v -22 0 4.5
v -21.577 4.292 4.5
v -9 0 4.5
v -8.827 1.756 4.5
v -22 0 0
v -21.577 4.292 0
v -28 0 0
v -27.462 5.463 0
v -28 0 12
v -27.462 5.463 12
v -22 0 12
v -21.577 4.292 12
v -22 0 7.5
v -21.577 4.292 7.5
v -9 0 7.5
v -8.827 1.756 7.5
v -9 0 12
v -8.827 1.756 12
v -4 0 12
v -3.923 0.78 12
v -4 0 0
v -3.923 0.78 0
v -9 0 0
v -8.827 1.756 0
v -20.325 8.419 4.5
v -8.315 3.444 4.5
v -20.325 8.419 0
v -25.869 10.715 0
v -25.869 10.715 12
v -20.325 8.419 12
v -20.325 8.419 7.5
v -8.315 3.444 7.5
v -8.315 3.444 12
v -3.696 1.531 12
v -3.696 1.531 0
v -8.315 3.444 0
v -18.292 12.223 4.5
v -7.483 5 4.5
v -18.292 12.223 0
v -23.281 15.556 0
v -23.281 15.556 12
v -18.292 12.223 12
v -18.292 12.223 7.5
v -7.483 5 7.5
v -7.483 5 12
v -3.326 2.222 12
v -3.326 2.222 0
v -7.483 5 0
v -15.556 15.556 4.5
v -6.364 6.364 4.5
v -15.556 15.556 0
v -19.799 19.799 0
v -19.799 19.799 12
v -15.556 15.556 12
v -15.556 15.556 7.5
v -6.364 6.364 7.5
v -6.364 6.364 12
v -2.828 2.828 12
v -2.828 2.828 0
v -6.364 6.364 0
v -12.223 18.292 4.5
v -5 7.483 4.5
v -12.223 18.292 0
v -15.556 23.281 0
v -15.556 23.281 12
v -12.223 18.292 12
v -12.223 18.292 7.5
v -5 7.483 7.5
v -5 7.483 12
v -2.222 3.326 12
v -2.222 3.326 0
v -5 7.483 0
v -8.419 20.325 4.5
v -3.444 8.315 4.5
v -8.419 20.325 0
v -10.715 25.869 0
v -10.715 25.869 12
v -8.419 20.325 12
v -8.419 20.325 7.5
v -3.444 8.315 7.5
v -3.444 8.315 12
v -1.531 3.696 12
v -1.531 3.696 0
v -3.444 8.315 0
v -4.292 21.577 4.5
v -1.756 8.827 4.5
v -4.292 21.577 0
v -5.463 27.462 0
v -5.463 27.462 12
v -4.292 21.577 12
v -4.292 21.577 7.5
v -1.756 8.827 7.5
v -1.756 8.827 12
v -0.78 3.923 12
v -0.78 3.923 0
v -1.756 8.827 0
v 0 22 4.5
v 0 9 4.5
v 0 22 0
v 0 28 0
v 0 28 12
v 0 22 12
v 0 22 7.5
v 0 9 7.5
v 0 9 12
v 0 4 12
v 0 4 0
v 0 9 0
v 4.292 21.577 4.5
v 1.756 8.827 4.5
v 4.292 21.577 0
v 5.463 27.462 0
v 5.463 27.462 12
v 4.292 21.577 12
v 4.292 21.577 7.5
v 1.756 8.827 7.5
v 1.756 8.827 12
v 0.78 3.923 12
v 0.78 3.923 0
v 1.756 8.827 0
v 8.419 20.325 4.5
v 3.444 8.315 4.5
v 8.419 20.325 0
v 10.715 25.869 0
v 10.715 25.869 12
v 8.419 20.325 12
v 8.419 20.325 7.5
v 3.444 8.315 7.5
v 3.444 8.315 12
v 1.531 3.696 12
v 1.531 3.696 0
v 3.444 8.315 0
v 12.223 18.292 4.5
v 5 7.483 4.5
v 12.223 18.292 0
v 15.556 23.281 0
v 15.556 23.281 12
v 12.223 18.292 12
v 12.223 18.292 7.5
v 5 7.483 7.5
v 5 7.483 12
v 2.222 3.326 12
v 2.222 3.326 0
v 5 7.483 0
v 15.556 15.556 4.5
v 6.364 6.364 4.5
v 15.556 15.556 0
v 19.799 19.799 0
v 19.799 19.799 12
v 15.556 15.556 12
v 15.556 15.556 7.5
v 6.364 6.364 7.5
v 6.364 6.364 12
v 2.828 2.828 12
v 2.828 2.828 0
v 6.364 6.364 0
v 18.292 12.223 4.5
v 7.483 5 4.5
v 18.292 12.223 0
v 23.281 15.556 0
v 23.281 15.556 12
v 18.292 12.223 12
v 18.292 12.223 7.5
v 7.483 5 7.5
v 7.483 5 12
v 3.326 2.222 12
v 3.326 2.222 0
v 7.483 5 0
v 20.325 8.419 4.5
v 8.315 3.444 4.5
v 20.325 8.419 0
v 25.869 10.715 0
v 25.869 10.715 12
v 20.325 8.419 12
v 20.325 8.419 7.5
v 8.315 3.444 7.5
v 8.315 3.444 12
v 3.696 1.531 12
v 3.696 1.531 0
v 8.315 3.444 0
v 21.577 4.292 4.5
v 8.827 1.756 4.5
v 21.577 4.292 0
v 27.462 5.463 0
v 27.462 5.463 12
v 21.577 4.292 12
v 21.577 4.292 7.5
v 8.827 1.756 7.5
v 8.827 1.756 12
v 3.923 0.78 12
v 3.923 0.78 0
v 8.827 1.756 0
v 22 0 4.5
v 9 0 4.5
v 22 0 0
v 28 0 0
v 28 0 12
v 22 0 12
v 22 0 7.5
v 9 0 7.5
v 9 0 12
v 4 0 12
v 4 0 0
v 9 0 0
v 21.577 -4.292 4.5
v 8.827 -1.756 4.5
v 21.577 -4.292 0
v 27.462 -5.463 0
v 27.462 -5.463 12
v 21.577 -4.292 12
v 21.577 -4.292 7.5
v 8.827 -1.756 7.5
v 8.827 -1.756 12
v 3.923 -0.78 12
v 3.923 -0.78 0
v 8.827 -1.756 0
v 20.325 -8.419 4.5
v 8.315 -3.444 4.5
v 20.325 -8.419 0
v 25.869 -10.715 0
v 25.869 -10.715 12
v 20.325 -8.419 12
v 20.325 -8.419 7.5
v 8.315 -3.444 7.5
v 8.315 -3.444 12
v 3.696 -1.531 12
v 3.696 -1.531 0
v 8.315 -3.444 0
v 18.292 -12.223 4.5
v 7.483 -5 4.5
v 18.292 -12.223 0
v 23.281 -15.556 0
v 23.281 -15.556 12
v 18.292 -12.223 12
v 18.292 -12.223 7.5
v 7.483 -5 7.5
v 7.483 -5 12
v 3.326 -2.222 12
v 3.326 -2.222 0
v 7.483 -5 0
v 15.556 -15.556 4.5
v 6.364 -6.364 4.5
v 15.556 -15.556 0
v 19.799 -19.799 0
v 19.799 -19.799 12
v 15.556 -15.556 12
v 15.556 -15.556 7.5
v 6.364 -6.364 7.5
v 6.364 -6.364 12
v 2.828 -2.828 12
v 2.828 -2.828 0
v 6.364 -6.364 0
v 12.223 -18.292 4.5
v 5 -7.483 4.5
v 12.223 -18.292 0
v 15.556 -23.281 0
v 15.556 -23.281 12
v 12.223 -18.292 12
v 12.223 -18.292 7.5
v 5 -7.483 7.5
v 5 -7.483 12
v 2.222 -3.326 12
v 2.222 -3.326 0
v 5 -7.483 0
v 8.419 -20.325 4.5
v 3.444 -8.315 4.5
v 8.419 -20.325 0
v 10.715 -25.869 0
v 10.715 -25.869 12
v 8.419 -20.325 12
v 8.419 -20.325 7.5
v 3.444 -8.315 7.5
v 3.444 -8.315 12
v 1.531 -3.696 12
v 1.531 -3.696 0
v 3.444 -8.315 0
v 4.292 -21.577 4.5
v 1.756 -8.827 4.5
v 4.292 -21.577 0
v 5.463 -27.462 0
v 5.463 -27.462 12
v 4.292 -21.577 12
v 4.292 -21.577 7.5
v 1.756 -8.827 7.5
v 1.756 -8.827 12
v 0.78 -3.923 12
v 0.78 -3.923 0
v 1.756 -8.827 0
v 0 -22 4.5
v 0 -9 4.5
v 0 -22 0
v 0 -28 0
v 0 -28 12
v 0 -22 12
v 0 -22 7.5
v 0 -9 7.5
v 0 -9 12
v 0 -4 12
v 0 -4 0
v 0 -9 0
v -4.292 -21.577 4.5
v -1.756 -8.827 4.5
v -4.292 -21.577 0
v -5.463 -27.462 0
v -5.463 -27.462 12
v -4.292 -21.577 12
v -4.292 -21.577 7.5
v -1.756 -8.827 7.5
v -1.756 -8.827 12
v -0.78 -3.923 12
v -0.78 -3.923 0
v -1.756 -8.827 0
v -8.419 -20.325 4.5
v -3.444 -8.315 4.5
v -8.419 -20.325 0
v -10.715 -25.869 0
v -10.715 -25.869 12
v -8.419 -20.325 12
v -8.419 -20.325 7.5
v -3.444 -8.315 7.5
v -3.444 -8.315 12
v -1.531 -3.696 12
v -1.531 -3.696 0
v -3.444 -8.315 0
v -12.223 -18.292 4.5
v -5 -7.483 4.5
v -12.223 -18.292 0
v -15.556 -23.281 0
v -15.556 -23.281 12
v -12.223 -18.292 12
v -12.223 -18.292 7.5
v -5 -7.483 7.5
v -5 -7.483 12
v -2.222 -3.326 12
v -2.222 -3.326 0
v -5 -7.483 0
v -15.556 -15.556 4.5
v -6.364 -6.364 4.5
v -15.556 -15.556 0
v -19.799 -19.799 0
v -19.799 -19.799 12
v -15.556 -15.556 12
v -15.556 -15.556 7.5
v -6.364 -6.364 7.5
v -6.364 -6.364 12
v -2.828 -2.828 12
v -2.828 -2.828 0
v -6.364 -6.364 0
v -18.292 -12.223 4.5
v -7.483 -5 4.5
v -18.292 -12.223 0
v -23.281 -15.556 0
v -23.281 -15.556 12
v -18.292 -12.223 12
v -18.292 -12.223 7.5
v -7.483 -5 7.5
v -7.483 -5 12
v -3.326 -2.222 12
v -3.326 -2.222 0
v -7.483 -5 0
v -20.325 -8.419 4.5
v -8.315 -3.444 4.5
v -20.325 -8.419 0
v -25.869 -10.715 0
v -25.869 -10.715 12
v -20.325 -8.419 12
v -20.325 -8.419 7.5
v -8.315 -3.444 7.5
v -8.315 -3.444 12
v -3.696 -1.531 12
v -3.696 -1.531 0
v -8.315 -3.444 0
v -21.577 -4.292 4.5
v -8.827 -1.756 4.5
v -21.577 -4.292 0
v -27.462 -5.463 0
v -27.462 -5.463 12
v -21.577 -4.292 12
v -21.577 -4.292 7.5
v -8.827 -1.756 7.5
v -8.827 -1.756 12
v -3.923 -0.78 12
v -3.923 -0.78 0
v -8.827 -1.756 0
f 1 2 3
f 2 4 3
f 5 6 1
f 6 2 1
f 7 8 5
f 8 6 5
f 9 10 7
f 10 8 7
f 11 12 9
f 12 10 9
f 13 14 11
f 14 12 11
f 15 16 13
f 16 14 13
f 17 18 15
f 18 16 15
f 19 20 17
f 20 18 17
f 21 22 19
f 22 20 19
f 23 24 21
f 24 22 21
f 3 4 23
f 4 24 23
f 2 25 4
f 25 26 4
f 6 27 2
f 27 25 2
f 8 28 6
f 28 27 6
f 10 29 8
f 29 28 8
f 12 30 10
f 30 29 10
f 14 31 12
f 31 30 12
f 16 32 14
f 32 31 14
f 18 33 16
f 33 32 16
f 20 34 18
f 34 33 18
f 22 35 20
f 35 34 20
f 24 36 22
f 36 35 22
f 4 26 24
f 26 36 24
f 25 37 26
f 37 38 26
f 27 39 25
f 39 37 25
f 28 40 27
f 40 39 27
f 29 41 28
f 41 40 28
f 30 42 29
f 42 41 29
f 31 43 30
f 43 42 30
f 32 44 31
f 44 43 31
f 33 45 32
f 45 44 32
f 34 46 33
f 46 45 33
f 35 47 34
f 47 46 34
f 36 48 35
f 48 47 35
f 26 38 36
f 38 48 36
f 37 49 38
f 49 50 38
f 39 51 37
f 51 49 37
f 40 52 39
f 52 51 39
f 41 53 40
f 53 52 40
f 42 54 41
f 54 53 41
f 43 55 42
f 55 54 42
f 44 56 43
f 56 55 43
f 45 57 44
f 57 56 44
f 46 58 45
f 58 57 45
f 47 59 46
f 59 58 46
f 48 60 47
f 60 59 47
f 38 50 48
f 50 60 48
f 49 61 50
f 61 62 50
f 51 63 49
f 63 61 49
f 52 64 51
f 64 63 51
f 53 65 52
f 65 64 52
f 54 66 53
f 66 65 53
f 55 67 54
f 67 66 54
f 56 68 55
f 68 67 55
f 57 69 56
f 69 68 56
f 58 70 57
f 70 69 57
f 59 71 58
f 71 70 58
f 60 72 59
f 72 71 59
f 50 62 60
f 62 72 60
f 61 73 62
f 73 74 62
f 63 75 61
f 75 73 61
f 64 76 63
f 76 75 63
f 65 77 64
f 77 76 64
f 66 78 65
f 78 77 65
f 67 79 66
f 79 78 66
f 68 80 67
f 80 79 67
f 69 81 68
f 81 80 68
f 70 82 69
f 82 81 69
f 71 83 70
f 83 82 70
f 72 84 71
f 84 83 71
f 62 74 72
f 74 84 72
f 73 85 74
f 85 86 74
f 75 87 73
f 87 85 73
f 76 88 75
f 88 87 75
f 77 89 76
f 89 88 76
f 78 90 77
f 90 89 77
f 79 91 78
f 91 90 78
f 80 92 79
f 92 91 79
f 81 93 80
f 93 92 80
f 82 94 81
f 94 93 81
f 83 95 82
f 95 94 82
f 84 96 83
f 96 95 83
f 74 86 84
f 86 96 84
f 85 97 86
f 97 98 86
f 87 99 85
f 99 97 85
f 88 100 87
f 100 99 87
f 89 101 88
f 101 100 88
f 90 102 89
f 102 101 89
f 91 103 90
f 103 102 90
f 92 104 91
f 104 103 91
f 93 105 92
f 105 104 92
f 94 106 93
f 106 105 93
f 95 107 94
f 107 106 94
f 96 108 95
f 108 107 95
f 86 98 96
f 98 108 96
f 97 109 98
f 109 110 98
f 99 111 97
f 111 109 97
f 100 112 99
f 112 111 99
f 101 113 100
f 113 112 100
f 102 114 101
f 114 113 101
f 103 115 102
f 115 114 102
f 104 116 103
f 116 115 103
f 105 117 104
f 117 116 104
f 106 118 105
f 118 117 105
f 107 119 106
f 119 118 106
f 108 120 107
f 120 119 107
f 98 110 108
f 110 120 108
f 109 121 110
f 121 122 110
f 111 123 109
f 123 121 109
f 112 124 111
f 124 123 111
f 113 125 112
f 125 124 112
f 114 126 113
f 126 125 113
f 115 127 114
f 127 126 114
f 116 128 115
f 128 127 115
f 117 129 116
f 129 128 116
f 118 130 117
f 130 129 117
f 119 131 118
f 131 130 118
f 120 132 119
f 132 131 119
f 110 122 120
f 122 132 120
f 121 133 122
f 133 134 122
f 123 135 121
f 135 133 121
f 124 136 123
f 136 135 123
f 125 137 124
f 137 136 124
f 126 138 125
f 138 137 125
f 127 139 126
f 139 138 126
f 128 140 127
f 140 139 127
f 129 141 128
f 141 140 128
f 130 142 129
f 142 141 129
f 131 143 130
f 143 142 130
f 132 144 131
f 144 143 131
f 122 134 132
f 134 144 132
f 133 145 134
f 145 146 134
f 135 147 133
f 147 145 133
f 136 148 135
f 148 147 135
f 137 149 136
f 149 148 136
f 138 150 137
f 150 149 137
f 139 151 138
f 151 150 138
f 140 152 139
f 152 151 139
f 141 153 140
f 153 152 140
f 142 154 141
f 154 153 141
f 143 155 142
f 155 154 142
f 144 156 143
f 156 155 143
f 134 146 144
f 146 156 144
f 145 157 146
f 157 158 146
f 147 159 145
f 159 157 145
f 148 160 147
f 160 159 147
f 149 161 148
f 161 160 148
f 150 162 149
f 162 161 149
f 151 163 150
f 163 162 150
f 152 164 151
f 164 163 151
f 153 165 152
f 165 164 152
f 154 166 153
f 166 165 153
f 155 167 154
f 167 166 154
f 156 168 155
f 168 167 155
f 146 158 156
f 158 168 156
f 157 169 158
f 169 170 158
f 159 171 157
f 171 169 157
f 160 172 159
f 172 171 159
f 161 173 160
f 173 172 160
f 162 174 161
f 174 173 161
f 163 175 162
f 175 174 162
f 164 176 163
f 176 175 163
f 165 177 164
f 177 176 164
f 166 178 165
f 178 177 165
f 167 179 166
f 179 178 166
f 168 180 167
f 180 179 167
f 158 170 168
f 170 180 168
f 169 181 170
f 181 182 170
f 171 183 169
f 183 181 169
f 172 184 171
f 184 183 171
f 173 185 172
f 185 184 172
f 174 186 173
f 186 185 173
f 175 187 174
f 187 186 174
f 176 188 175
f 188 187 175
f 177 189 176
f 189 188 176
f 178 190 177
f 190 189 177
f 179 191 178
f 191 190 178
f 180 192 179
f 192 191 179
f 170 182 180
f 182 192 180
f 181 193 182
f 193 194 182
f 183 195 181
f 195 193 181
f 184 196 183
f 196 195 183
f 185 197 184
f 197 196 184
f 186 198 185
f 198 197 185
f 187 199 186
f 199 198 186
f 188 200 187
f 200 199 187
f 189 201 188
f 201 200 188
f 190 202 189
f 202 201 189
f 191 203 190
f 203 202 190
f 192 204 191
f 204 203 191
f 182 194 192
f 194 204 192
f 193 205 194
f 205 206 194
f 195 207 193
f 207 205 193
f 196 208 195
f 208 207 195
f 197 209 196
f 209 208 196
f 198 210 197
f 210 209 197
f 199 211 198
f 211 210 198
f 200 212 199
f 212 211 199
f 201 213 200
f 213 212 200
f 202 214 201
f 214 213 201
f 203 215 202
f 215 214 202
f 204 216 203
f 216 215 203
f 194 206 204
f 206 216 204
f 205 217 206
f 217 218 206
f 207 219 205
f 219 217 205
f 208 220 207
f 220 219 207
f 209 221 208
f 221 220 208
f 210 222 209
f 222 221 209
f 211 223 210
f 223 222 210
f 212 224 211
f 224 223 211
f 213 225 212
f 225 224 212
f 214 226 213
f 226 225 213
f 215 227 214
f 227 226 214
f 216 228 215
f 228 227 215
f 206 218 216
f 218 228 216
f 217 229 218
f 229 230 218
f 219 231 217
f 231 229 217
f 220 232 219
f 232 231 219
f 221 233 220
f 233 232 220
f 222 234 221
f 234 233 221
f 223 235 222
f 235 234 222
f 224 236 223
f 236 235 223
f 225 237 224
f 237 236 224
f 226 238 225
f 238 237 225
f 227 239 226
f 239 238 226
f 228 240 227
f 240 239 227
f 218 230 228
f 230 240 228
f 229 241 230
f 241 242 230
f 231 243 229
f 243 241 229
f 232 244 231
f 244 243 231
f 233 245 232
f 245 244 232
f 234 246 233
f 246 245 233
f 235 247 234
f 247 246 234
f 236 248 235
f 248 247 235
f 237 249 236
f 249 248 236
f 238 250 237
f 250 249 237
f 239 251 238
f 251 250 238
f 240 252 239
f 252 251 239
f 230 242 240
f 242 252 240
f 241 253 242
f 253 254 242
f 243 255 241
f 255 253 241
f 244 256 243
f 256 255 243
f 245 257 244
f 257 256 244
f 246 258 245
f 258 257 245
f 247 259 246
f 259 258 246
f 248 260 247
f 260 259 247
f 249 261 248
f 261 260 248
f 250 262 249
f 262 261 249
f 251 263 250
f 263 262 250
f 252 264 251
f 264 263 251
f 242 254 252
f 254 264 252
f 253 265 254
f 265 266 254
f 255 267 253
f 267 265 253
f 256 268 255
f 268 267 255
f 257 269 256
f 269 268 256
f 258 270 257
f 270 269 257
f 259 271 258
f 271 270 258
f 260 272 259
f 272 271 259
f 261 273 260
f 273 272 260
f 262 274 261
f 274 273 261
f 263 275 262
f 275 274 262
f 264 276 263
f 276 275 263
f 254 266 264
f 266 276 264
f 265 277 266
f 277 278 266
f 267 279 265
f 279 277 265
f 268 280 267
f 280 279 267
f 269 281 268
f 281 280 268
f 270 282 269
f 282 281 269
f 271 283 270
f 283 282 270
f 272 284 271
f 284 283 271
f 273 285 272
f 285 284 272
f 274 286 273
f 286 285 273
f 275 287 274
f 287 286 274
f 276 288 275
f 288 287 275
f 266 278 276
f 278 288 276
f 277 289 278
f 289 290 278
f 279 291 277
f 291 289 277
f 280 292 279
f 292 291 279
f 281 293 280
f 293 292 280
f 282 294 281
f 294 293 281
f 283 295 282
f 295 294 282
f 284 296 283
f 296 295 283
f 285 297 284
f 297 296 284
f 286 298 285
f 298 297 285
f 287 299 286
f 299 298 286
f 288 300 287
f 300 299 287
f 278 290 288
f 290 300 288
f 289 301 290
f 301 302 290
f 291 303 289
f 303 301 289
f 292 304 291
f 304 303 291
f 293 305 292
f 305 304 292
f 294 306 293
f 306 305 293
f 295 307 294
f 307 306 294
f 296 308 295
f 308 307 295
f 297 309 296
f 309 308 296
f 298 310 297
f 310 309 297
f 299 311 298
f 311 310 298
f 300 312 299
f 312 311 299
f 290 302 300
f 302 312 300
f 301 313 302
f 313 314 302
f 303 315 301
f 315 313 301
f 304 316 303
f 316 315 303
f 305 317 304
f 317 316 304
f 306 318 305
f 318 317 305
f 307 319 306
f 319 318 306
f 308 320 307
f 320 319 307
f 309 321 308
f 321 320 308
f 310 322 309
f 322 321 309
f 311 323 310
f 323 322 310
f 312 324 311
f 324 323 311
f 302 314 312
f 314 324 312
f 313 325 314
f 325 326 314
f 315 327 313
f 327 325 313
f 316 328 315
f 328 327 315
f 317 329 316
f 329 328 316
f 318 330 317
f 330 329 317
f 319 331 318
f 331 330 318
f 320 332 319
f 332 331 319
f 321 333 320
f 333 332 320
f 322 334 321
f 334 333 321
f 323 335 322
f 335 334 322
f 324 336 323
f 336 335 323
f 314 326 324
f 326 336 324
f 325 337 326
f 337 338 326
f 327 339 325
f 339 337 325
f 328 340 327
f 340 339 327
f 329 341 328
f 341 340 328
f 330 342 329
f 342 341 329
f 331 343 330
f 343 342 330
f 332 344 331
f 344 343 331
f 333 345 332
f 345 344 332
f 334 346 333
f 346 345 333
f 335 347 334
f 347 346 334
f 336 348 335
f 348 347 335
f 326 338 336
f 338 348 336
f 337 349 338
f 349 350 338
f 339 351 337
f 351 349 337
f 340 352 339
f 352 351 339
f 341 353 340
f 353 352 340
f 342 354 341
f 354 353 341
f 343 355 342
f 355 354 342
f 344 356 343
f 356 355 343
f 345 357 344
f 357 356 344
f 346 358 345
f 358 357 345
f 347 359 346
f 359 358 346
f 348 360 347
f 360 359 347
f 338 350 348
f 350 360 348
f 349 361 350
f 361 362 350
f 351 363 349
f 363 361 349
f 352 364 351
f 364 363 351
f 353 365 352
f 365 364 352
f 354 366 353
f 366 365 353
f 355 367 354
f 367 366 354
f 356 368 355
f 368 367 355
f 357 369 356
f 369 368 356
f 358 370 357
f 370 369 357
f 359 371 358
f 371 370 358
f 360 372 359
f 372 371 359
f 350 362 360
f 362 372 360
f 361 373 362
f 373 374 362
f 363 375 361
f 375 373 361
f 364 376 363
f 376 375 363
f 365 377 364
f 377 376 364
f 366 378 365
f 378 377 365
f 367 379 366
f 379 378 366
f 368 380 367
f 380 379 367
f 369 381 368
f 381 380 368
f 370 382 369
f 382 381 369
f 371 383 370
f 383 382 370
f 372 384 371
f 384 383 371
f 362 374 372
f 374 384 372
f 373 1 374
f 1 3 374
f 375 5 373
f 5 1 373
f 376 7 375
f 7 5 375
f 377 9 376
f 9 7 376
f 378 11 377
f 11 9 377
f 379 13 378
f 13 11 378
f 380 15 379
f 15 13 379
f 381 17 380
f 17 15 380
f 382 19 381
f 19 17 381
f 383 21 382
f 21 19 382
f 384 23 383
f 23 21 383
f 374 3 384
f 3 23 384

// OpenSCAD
$fn = 32;

// ----------------------------------------------------------------------
// Revolved part: handwheel R28
// ----------------------------------------------------------------------

// --- parameters (mm) ---
bore_r = 4;               // bore radius
rim_r = 28;               // rim radius
rim_w = 6;                // rim axial width
rim_t = 12;               // rim diameter height
hub_r = 9;                // hub radius
web_t = 3;                // web thickness
revolve_angle = 360;      // revolve sweep, degrees

bore_d = 2 * bore_r;
rim_d = 2 * rim_r;
hub_d = 2 * hub_r;

profile = [[4, 0], [9, 0], [9, 4.5], [22, 4.5], [22, 0], [28, 0], [28, 12], [22, 12], [22, 7.5], [9, 7.5], [9, 12], [4, 12]];  // primary outline, 12 points, counter clockwise

// --- the one profile operation ---
rotate_extrude(angle = revolve_angle) polygon(points = profile);
